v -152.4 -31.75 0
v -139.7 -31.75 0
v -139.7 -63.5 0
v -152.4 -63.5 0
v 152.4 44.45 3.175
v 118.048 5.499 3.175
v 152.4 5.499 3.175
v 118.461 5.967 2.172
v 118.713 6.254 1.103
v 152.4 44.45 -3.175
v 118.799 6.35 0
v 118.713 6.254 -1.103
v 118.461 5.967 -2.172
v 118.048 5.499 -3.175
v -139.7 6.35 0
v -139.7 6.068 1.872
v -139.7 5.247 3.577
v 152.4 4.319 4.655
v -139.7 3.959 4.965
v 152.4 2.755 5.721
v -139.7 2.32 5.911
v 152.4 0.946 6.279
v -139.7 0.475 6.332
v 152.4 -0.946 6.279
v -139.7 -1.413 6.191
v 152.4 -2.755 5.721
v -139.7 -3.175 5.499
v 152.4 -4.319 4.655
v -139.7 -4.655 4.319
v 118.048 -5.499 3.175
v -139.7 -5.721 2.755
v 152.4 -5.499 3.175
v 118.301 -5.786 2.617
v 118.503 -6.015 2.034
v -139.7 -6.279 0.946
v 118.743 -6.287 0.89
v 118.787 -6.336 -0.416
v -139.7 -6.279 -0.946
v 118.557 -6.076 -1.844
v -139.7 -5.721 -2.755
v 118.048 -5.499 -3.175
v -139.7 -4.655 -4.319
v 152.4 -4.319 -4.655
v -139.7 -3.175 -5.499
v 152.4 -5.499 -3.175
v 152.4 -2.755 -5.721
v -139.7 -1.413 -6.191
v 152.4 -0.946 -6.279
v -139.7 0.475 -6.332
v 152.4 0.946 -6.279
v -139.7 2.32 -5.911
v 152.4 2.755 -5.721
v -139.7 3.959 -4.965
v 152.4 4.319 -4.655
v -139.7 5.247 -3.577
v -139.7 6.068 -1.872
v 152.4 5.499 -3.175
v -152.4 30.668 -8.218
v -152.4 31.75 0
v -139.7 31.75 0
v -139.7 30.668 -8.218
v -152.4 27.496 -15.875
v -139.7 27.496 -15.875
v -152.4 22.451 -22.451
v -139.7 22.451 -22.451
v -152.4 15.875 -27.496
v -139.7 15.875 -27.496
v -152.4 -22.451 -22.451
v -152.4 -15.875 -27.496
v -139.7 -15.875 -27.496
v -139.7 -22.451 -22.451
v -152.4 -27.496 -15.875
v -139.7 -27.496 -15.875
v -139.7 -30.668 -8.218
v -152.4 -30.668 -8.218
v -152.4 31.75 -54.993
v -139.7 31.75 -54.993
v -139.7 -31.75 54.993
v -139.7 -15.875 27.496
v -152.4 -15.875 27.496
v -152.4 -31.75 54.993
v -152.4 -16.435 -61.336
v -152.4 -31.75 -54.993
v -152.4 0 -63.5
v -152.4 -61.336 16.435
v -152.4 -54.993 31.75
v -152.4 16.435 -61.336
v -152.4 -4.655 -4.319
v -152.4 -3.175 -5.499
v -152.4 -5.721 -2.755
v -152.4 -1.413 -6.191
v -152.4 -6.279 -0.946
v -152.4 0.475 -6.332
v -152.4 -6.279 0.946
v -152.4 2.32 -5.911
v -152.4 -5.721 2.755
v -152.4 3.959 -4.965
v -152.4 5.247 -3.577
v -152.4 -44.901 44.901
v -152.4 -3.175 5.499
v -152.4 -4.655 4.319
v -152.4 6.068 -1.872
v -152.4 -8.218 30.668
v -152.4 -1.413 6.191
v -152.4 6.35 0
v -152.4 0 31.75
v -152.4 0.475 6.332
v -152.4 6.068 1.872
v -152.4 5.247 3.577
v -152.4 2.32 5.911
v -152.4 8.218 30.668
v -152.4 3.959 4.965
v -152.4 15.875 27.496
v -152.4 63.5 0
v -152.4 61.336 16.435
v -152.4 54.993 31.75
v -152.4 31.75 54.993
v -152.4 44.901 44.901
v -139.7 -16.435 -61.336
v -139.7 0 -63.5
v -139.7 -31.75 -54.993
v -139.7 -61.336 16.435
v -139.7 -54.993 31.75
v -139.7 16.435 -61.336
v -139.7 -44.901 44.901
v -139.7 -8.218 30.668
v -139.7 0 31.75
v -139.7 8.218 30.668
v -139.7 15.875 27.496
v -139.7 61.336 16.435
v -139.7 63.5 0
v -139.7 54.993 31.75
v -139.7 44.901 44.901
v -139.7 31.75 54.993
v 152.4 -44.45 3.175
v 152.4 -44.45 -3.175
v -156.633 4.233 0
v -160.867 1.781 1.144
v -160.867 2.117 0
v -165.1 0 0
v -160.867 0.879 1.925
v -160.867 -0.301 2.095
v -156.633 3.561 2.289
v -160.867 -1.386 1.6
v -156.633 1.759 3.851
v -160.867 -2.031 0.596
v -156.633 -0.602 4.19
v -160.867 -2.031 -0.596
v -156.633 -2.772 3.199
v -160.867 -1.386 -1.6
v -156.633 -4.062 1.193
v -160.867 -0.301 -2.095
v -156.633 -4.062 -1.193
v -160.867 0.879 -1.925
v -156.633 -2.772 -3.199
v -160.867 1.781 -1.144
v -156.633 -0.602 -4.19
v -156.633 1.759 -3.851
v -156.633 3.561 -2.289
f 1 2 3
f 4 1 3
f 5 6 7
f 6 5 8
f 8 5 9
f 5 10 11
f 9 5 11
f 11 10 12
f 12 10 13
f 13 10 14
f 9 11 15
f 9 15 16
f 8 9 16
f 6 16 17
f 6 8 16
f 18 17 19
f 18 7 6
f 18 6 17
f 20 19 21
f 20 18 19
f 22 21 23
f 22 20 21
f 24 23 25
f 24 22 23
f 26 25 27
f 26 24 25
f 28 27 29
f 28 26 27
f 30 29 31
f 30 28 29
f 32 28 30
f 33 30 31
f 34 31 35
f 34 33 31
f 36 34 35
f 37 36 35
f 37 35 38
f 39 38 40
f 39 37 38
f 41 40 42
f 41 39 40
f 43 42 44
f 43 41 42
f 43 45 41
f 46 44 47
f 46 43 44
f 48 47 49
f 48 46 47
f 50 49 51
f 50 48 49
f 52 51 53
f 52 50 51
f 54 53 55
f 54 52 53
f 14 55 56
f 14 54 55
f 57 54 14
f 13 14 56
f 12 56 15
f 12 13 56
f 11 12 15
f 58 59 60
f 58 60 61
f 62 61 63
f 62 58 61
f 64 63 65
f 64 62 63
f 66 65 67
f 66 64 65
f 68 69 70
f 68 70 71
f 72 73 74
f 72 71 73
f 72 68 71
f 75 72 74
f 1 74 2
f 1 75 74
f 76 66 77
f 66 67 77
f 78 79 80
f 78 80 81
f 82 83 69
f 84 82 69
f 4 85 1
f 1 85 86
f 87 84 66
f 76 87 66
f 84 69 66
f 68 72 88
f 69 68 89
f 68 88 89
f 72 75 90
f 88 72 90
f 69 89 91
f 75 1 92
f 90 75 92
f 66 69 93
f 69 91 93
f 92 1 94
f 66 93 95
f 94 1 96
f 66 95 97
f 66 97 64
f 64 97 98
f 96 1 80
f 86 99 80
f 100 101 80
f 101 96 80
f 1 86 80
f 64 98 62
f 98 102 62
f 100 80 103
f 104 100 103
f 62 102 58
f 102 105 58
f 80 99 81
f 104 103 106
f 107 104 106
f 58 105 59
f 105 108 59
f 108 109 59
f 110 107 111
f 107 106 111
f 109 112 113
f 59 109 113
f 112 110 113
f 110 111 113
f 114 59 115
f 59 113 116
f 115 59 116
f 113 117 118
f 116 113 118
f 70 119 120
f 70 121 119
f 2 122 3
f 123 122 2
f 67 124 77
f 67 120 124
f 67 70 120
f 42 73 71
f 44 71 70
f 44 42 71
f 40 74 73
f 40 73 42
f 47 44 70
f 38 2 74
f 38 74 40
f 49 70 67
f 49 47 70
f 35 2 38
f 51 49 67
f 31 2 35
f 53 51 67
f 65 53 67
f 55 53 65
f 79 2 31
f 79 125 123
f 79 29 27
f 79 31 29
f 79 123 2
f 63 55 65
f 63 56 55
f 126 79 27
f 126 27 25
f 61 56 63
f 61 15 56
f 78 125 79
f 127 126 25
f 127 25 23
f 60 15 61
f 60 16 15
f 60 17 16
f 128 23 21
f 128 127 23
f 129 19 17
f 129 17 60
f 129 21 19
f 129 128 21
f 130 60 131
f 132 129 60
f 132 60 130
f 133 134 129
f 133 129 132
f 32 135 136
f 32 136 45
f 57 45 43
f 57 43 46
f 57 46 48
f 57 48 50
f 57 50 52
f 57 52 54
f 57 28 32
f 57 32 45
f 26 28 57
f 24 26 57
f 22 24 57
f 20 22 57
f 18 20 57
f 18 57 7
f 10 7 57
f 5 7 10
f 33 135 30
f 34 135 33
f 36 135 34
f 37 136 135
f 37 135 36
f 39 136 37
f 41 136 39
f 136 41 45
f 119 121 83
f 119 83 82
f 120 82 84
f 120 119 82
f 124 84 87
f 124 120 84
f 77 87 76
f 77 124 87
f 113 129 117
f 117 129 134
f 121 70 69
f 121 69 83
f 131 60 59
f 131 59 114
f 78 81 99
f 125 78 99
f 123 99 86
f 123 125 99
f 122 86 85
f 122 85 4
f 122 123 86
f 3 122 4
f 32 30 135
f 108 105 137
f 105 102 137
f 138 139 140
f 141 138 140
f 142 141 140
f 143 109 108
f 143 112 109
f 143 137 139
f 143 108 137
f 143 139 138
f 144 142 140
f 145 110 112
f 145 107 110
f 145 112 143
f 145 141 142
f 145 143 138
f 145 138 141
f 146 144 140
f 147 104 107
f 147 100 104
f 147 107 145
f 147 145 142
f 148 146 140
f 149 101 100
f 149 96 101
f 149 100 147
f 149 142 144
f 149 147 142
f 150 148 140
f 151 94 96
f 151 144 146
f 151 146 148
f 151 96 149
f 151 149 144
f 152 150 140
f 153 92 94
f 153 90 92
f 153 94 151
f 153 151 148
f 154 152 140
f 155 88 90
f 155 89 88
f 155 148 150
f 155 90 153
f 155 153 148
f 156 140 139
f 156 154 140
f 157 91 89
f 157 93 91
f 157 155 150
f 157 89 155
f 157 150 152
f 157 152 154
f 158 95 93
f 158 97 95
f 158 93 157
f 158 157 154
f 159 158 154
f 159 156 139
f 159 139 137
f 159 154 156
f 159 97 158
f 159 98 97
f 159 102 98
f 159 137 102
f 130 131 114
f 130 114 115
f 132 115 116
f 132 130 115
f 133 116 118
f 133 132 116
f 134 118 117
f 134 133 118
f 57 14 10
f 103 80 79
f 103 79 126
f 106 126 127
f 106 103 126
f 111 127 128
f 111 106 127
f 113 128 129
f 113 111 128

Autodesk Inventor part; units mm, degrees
ref_plane "YZ Plane" through (0, 0, 0) normal (1, 0, 0) x (0, 1, 0)
ref_plane "XZ Plane" through (0, 0, 0) normal (0, 1, 0) x (-1, 0, 0)
ref_plane "XY Plane" through (0, 0, 0) normal (0, 0, 1) x (1, 0, 0)
sketch "Sketch1" plane through (0, 0, 0) normal (0, 0, 1) x (1, 0, 0)
  line L0 (-152.4, 6.35) -> (152.4, 6.35)
  line L1 (152.4, 6.35) -> (152.4, -6.35)
  line L2 (152.4, -6.35) -> (-152.4, -6.35)
  line L3 (-152.4, -6.35) -> (-152.4, 6.35)
  line L4 (-152.4, 6.35) -> (152.4, -6.35) construction
  line L5 (152.4, 6.35) -> (-152.4, -6.35) construction
  line L6 (-152.4, 0) -> (-146.05, 0)
  line L7 (-152.4, -31.75) -> (-139.7, -31.75)
  line L8 (-139.7, -31.75) -> (-139.7, 31.75)
  line L9 (-139.7, 31.75) -> (-152.4, 31.75)
  line L10 (-152.4, 31.75) -> (-152.4, -31.75)
  line L11 (-152.4, -31.75) -> (-139.7, 31.75) construction
  line L12 (-139.7, -31.75) -> (-152.4, 31.75) construction
  line L13 (-152.4, 0) -> (-165.1, 0)
  line L14 (-165.1, 0) -> (-152.4, 6.35)
  line L15 (152.4, 0) -> (152.4, 44.45)
  line L16 (152.4, 44.45) -> (113.1983, 0)
  line L17 (-146.05, 0) -> (152.4, 0)
  line L18 (152.4, 0) -> (152.4, -44.45)
  line L19 (152.4, -44.45) -> (113.1983, 0)
  point P0 (0, 0)
  point P1 (-139.7, 6.35)
  dimension "d0" = 304.8
  dimension "d1" = 12.7
  dimension "d2" = 6.35
  dimension "d3" = 12.7
  dimension "d4" = 63.5
  dimension "d5" = 12.7
  dimension "d6" = 44.45
  dimension "d8" = 41.41
revolve "Revolution1" add sketch "Sketch1" angle 360 about axis through (-146.05, 0, 0) along (1, 0, 0) contours L10 L9 L8 L0 | L0 L8 L17 L6 L3 | L3 L13 L14 | L0 L16 L17 L8 | L0 L1 L17 L16
extrude "Extrusion1" add sketch "Sketch1" along normal mid plane 6.35 contours L16 L15 L0 | L0 L1 L17 L16 | L17 L1 L2 L19 | L2 L18 L19
sketch "Sketch2" plane through (-139.7, 0, 0) normal (1, 0, 0) x (0, 0, -1)
  circle A0 centre (0, 0) radius 63.5
  circle A1 centre (0, 0) radius 6.35
  line L0 (0, 0) -> (0, 63.5)
  line L1 (0, 0) -> (54.9926, -31.75)
  line L2 (0, 0) -> (-54.9926, -31.75)
  line L3 (0, 0) -> (54.9926, 31.75)
  line L4 (0, 0) -> (0, -63.5)
  line L5 (0, 0) -> (-54.9926, 31.75)
  circle A2 centre (0, 0) radius 31.75
  point P0 (0, -31.75)
  point P1 (-27.4963, -15.875)
  point P2 (27.4963, 15.875)
  point P3 (27.4963, -15.875)
  point P4 (-27.4963, 15.875)
  point P5 (0, 31.75)
  dimension "d12" = 12.7
  dimension "d13" = 120
  dimension "d14" = 120
  dimension "d15" = 60
  dimension "d16" = 60
extrude "Extrusion2" add sketch "Sketch2" against normal blind 12.7 contours A0 L1 A2 L3 | L0 A2 L5 A0 | A0 L2 A2 L4
properties part number "Powder Arrow"
